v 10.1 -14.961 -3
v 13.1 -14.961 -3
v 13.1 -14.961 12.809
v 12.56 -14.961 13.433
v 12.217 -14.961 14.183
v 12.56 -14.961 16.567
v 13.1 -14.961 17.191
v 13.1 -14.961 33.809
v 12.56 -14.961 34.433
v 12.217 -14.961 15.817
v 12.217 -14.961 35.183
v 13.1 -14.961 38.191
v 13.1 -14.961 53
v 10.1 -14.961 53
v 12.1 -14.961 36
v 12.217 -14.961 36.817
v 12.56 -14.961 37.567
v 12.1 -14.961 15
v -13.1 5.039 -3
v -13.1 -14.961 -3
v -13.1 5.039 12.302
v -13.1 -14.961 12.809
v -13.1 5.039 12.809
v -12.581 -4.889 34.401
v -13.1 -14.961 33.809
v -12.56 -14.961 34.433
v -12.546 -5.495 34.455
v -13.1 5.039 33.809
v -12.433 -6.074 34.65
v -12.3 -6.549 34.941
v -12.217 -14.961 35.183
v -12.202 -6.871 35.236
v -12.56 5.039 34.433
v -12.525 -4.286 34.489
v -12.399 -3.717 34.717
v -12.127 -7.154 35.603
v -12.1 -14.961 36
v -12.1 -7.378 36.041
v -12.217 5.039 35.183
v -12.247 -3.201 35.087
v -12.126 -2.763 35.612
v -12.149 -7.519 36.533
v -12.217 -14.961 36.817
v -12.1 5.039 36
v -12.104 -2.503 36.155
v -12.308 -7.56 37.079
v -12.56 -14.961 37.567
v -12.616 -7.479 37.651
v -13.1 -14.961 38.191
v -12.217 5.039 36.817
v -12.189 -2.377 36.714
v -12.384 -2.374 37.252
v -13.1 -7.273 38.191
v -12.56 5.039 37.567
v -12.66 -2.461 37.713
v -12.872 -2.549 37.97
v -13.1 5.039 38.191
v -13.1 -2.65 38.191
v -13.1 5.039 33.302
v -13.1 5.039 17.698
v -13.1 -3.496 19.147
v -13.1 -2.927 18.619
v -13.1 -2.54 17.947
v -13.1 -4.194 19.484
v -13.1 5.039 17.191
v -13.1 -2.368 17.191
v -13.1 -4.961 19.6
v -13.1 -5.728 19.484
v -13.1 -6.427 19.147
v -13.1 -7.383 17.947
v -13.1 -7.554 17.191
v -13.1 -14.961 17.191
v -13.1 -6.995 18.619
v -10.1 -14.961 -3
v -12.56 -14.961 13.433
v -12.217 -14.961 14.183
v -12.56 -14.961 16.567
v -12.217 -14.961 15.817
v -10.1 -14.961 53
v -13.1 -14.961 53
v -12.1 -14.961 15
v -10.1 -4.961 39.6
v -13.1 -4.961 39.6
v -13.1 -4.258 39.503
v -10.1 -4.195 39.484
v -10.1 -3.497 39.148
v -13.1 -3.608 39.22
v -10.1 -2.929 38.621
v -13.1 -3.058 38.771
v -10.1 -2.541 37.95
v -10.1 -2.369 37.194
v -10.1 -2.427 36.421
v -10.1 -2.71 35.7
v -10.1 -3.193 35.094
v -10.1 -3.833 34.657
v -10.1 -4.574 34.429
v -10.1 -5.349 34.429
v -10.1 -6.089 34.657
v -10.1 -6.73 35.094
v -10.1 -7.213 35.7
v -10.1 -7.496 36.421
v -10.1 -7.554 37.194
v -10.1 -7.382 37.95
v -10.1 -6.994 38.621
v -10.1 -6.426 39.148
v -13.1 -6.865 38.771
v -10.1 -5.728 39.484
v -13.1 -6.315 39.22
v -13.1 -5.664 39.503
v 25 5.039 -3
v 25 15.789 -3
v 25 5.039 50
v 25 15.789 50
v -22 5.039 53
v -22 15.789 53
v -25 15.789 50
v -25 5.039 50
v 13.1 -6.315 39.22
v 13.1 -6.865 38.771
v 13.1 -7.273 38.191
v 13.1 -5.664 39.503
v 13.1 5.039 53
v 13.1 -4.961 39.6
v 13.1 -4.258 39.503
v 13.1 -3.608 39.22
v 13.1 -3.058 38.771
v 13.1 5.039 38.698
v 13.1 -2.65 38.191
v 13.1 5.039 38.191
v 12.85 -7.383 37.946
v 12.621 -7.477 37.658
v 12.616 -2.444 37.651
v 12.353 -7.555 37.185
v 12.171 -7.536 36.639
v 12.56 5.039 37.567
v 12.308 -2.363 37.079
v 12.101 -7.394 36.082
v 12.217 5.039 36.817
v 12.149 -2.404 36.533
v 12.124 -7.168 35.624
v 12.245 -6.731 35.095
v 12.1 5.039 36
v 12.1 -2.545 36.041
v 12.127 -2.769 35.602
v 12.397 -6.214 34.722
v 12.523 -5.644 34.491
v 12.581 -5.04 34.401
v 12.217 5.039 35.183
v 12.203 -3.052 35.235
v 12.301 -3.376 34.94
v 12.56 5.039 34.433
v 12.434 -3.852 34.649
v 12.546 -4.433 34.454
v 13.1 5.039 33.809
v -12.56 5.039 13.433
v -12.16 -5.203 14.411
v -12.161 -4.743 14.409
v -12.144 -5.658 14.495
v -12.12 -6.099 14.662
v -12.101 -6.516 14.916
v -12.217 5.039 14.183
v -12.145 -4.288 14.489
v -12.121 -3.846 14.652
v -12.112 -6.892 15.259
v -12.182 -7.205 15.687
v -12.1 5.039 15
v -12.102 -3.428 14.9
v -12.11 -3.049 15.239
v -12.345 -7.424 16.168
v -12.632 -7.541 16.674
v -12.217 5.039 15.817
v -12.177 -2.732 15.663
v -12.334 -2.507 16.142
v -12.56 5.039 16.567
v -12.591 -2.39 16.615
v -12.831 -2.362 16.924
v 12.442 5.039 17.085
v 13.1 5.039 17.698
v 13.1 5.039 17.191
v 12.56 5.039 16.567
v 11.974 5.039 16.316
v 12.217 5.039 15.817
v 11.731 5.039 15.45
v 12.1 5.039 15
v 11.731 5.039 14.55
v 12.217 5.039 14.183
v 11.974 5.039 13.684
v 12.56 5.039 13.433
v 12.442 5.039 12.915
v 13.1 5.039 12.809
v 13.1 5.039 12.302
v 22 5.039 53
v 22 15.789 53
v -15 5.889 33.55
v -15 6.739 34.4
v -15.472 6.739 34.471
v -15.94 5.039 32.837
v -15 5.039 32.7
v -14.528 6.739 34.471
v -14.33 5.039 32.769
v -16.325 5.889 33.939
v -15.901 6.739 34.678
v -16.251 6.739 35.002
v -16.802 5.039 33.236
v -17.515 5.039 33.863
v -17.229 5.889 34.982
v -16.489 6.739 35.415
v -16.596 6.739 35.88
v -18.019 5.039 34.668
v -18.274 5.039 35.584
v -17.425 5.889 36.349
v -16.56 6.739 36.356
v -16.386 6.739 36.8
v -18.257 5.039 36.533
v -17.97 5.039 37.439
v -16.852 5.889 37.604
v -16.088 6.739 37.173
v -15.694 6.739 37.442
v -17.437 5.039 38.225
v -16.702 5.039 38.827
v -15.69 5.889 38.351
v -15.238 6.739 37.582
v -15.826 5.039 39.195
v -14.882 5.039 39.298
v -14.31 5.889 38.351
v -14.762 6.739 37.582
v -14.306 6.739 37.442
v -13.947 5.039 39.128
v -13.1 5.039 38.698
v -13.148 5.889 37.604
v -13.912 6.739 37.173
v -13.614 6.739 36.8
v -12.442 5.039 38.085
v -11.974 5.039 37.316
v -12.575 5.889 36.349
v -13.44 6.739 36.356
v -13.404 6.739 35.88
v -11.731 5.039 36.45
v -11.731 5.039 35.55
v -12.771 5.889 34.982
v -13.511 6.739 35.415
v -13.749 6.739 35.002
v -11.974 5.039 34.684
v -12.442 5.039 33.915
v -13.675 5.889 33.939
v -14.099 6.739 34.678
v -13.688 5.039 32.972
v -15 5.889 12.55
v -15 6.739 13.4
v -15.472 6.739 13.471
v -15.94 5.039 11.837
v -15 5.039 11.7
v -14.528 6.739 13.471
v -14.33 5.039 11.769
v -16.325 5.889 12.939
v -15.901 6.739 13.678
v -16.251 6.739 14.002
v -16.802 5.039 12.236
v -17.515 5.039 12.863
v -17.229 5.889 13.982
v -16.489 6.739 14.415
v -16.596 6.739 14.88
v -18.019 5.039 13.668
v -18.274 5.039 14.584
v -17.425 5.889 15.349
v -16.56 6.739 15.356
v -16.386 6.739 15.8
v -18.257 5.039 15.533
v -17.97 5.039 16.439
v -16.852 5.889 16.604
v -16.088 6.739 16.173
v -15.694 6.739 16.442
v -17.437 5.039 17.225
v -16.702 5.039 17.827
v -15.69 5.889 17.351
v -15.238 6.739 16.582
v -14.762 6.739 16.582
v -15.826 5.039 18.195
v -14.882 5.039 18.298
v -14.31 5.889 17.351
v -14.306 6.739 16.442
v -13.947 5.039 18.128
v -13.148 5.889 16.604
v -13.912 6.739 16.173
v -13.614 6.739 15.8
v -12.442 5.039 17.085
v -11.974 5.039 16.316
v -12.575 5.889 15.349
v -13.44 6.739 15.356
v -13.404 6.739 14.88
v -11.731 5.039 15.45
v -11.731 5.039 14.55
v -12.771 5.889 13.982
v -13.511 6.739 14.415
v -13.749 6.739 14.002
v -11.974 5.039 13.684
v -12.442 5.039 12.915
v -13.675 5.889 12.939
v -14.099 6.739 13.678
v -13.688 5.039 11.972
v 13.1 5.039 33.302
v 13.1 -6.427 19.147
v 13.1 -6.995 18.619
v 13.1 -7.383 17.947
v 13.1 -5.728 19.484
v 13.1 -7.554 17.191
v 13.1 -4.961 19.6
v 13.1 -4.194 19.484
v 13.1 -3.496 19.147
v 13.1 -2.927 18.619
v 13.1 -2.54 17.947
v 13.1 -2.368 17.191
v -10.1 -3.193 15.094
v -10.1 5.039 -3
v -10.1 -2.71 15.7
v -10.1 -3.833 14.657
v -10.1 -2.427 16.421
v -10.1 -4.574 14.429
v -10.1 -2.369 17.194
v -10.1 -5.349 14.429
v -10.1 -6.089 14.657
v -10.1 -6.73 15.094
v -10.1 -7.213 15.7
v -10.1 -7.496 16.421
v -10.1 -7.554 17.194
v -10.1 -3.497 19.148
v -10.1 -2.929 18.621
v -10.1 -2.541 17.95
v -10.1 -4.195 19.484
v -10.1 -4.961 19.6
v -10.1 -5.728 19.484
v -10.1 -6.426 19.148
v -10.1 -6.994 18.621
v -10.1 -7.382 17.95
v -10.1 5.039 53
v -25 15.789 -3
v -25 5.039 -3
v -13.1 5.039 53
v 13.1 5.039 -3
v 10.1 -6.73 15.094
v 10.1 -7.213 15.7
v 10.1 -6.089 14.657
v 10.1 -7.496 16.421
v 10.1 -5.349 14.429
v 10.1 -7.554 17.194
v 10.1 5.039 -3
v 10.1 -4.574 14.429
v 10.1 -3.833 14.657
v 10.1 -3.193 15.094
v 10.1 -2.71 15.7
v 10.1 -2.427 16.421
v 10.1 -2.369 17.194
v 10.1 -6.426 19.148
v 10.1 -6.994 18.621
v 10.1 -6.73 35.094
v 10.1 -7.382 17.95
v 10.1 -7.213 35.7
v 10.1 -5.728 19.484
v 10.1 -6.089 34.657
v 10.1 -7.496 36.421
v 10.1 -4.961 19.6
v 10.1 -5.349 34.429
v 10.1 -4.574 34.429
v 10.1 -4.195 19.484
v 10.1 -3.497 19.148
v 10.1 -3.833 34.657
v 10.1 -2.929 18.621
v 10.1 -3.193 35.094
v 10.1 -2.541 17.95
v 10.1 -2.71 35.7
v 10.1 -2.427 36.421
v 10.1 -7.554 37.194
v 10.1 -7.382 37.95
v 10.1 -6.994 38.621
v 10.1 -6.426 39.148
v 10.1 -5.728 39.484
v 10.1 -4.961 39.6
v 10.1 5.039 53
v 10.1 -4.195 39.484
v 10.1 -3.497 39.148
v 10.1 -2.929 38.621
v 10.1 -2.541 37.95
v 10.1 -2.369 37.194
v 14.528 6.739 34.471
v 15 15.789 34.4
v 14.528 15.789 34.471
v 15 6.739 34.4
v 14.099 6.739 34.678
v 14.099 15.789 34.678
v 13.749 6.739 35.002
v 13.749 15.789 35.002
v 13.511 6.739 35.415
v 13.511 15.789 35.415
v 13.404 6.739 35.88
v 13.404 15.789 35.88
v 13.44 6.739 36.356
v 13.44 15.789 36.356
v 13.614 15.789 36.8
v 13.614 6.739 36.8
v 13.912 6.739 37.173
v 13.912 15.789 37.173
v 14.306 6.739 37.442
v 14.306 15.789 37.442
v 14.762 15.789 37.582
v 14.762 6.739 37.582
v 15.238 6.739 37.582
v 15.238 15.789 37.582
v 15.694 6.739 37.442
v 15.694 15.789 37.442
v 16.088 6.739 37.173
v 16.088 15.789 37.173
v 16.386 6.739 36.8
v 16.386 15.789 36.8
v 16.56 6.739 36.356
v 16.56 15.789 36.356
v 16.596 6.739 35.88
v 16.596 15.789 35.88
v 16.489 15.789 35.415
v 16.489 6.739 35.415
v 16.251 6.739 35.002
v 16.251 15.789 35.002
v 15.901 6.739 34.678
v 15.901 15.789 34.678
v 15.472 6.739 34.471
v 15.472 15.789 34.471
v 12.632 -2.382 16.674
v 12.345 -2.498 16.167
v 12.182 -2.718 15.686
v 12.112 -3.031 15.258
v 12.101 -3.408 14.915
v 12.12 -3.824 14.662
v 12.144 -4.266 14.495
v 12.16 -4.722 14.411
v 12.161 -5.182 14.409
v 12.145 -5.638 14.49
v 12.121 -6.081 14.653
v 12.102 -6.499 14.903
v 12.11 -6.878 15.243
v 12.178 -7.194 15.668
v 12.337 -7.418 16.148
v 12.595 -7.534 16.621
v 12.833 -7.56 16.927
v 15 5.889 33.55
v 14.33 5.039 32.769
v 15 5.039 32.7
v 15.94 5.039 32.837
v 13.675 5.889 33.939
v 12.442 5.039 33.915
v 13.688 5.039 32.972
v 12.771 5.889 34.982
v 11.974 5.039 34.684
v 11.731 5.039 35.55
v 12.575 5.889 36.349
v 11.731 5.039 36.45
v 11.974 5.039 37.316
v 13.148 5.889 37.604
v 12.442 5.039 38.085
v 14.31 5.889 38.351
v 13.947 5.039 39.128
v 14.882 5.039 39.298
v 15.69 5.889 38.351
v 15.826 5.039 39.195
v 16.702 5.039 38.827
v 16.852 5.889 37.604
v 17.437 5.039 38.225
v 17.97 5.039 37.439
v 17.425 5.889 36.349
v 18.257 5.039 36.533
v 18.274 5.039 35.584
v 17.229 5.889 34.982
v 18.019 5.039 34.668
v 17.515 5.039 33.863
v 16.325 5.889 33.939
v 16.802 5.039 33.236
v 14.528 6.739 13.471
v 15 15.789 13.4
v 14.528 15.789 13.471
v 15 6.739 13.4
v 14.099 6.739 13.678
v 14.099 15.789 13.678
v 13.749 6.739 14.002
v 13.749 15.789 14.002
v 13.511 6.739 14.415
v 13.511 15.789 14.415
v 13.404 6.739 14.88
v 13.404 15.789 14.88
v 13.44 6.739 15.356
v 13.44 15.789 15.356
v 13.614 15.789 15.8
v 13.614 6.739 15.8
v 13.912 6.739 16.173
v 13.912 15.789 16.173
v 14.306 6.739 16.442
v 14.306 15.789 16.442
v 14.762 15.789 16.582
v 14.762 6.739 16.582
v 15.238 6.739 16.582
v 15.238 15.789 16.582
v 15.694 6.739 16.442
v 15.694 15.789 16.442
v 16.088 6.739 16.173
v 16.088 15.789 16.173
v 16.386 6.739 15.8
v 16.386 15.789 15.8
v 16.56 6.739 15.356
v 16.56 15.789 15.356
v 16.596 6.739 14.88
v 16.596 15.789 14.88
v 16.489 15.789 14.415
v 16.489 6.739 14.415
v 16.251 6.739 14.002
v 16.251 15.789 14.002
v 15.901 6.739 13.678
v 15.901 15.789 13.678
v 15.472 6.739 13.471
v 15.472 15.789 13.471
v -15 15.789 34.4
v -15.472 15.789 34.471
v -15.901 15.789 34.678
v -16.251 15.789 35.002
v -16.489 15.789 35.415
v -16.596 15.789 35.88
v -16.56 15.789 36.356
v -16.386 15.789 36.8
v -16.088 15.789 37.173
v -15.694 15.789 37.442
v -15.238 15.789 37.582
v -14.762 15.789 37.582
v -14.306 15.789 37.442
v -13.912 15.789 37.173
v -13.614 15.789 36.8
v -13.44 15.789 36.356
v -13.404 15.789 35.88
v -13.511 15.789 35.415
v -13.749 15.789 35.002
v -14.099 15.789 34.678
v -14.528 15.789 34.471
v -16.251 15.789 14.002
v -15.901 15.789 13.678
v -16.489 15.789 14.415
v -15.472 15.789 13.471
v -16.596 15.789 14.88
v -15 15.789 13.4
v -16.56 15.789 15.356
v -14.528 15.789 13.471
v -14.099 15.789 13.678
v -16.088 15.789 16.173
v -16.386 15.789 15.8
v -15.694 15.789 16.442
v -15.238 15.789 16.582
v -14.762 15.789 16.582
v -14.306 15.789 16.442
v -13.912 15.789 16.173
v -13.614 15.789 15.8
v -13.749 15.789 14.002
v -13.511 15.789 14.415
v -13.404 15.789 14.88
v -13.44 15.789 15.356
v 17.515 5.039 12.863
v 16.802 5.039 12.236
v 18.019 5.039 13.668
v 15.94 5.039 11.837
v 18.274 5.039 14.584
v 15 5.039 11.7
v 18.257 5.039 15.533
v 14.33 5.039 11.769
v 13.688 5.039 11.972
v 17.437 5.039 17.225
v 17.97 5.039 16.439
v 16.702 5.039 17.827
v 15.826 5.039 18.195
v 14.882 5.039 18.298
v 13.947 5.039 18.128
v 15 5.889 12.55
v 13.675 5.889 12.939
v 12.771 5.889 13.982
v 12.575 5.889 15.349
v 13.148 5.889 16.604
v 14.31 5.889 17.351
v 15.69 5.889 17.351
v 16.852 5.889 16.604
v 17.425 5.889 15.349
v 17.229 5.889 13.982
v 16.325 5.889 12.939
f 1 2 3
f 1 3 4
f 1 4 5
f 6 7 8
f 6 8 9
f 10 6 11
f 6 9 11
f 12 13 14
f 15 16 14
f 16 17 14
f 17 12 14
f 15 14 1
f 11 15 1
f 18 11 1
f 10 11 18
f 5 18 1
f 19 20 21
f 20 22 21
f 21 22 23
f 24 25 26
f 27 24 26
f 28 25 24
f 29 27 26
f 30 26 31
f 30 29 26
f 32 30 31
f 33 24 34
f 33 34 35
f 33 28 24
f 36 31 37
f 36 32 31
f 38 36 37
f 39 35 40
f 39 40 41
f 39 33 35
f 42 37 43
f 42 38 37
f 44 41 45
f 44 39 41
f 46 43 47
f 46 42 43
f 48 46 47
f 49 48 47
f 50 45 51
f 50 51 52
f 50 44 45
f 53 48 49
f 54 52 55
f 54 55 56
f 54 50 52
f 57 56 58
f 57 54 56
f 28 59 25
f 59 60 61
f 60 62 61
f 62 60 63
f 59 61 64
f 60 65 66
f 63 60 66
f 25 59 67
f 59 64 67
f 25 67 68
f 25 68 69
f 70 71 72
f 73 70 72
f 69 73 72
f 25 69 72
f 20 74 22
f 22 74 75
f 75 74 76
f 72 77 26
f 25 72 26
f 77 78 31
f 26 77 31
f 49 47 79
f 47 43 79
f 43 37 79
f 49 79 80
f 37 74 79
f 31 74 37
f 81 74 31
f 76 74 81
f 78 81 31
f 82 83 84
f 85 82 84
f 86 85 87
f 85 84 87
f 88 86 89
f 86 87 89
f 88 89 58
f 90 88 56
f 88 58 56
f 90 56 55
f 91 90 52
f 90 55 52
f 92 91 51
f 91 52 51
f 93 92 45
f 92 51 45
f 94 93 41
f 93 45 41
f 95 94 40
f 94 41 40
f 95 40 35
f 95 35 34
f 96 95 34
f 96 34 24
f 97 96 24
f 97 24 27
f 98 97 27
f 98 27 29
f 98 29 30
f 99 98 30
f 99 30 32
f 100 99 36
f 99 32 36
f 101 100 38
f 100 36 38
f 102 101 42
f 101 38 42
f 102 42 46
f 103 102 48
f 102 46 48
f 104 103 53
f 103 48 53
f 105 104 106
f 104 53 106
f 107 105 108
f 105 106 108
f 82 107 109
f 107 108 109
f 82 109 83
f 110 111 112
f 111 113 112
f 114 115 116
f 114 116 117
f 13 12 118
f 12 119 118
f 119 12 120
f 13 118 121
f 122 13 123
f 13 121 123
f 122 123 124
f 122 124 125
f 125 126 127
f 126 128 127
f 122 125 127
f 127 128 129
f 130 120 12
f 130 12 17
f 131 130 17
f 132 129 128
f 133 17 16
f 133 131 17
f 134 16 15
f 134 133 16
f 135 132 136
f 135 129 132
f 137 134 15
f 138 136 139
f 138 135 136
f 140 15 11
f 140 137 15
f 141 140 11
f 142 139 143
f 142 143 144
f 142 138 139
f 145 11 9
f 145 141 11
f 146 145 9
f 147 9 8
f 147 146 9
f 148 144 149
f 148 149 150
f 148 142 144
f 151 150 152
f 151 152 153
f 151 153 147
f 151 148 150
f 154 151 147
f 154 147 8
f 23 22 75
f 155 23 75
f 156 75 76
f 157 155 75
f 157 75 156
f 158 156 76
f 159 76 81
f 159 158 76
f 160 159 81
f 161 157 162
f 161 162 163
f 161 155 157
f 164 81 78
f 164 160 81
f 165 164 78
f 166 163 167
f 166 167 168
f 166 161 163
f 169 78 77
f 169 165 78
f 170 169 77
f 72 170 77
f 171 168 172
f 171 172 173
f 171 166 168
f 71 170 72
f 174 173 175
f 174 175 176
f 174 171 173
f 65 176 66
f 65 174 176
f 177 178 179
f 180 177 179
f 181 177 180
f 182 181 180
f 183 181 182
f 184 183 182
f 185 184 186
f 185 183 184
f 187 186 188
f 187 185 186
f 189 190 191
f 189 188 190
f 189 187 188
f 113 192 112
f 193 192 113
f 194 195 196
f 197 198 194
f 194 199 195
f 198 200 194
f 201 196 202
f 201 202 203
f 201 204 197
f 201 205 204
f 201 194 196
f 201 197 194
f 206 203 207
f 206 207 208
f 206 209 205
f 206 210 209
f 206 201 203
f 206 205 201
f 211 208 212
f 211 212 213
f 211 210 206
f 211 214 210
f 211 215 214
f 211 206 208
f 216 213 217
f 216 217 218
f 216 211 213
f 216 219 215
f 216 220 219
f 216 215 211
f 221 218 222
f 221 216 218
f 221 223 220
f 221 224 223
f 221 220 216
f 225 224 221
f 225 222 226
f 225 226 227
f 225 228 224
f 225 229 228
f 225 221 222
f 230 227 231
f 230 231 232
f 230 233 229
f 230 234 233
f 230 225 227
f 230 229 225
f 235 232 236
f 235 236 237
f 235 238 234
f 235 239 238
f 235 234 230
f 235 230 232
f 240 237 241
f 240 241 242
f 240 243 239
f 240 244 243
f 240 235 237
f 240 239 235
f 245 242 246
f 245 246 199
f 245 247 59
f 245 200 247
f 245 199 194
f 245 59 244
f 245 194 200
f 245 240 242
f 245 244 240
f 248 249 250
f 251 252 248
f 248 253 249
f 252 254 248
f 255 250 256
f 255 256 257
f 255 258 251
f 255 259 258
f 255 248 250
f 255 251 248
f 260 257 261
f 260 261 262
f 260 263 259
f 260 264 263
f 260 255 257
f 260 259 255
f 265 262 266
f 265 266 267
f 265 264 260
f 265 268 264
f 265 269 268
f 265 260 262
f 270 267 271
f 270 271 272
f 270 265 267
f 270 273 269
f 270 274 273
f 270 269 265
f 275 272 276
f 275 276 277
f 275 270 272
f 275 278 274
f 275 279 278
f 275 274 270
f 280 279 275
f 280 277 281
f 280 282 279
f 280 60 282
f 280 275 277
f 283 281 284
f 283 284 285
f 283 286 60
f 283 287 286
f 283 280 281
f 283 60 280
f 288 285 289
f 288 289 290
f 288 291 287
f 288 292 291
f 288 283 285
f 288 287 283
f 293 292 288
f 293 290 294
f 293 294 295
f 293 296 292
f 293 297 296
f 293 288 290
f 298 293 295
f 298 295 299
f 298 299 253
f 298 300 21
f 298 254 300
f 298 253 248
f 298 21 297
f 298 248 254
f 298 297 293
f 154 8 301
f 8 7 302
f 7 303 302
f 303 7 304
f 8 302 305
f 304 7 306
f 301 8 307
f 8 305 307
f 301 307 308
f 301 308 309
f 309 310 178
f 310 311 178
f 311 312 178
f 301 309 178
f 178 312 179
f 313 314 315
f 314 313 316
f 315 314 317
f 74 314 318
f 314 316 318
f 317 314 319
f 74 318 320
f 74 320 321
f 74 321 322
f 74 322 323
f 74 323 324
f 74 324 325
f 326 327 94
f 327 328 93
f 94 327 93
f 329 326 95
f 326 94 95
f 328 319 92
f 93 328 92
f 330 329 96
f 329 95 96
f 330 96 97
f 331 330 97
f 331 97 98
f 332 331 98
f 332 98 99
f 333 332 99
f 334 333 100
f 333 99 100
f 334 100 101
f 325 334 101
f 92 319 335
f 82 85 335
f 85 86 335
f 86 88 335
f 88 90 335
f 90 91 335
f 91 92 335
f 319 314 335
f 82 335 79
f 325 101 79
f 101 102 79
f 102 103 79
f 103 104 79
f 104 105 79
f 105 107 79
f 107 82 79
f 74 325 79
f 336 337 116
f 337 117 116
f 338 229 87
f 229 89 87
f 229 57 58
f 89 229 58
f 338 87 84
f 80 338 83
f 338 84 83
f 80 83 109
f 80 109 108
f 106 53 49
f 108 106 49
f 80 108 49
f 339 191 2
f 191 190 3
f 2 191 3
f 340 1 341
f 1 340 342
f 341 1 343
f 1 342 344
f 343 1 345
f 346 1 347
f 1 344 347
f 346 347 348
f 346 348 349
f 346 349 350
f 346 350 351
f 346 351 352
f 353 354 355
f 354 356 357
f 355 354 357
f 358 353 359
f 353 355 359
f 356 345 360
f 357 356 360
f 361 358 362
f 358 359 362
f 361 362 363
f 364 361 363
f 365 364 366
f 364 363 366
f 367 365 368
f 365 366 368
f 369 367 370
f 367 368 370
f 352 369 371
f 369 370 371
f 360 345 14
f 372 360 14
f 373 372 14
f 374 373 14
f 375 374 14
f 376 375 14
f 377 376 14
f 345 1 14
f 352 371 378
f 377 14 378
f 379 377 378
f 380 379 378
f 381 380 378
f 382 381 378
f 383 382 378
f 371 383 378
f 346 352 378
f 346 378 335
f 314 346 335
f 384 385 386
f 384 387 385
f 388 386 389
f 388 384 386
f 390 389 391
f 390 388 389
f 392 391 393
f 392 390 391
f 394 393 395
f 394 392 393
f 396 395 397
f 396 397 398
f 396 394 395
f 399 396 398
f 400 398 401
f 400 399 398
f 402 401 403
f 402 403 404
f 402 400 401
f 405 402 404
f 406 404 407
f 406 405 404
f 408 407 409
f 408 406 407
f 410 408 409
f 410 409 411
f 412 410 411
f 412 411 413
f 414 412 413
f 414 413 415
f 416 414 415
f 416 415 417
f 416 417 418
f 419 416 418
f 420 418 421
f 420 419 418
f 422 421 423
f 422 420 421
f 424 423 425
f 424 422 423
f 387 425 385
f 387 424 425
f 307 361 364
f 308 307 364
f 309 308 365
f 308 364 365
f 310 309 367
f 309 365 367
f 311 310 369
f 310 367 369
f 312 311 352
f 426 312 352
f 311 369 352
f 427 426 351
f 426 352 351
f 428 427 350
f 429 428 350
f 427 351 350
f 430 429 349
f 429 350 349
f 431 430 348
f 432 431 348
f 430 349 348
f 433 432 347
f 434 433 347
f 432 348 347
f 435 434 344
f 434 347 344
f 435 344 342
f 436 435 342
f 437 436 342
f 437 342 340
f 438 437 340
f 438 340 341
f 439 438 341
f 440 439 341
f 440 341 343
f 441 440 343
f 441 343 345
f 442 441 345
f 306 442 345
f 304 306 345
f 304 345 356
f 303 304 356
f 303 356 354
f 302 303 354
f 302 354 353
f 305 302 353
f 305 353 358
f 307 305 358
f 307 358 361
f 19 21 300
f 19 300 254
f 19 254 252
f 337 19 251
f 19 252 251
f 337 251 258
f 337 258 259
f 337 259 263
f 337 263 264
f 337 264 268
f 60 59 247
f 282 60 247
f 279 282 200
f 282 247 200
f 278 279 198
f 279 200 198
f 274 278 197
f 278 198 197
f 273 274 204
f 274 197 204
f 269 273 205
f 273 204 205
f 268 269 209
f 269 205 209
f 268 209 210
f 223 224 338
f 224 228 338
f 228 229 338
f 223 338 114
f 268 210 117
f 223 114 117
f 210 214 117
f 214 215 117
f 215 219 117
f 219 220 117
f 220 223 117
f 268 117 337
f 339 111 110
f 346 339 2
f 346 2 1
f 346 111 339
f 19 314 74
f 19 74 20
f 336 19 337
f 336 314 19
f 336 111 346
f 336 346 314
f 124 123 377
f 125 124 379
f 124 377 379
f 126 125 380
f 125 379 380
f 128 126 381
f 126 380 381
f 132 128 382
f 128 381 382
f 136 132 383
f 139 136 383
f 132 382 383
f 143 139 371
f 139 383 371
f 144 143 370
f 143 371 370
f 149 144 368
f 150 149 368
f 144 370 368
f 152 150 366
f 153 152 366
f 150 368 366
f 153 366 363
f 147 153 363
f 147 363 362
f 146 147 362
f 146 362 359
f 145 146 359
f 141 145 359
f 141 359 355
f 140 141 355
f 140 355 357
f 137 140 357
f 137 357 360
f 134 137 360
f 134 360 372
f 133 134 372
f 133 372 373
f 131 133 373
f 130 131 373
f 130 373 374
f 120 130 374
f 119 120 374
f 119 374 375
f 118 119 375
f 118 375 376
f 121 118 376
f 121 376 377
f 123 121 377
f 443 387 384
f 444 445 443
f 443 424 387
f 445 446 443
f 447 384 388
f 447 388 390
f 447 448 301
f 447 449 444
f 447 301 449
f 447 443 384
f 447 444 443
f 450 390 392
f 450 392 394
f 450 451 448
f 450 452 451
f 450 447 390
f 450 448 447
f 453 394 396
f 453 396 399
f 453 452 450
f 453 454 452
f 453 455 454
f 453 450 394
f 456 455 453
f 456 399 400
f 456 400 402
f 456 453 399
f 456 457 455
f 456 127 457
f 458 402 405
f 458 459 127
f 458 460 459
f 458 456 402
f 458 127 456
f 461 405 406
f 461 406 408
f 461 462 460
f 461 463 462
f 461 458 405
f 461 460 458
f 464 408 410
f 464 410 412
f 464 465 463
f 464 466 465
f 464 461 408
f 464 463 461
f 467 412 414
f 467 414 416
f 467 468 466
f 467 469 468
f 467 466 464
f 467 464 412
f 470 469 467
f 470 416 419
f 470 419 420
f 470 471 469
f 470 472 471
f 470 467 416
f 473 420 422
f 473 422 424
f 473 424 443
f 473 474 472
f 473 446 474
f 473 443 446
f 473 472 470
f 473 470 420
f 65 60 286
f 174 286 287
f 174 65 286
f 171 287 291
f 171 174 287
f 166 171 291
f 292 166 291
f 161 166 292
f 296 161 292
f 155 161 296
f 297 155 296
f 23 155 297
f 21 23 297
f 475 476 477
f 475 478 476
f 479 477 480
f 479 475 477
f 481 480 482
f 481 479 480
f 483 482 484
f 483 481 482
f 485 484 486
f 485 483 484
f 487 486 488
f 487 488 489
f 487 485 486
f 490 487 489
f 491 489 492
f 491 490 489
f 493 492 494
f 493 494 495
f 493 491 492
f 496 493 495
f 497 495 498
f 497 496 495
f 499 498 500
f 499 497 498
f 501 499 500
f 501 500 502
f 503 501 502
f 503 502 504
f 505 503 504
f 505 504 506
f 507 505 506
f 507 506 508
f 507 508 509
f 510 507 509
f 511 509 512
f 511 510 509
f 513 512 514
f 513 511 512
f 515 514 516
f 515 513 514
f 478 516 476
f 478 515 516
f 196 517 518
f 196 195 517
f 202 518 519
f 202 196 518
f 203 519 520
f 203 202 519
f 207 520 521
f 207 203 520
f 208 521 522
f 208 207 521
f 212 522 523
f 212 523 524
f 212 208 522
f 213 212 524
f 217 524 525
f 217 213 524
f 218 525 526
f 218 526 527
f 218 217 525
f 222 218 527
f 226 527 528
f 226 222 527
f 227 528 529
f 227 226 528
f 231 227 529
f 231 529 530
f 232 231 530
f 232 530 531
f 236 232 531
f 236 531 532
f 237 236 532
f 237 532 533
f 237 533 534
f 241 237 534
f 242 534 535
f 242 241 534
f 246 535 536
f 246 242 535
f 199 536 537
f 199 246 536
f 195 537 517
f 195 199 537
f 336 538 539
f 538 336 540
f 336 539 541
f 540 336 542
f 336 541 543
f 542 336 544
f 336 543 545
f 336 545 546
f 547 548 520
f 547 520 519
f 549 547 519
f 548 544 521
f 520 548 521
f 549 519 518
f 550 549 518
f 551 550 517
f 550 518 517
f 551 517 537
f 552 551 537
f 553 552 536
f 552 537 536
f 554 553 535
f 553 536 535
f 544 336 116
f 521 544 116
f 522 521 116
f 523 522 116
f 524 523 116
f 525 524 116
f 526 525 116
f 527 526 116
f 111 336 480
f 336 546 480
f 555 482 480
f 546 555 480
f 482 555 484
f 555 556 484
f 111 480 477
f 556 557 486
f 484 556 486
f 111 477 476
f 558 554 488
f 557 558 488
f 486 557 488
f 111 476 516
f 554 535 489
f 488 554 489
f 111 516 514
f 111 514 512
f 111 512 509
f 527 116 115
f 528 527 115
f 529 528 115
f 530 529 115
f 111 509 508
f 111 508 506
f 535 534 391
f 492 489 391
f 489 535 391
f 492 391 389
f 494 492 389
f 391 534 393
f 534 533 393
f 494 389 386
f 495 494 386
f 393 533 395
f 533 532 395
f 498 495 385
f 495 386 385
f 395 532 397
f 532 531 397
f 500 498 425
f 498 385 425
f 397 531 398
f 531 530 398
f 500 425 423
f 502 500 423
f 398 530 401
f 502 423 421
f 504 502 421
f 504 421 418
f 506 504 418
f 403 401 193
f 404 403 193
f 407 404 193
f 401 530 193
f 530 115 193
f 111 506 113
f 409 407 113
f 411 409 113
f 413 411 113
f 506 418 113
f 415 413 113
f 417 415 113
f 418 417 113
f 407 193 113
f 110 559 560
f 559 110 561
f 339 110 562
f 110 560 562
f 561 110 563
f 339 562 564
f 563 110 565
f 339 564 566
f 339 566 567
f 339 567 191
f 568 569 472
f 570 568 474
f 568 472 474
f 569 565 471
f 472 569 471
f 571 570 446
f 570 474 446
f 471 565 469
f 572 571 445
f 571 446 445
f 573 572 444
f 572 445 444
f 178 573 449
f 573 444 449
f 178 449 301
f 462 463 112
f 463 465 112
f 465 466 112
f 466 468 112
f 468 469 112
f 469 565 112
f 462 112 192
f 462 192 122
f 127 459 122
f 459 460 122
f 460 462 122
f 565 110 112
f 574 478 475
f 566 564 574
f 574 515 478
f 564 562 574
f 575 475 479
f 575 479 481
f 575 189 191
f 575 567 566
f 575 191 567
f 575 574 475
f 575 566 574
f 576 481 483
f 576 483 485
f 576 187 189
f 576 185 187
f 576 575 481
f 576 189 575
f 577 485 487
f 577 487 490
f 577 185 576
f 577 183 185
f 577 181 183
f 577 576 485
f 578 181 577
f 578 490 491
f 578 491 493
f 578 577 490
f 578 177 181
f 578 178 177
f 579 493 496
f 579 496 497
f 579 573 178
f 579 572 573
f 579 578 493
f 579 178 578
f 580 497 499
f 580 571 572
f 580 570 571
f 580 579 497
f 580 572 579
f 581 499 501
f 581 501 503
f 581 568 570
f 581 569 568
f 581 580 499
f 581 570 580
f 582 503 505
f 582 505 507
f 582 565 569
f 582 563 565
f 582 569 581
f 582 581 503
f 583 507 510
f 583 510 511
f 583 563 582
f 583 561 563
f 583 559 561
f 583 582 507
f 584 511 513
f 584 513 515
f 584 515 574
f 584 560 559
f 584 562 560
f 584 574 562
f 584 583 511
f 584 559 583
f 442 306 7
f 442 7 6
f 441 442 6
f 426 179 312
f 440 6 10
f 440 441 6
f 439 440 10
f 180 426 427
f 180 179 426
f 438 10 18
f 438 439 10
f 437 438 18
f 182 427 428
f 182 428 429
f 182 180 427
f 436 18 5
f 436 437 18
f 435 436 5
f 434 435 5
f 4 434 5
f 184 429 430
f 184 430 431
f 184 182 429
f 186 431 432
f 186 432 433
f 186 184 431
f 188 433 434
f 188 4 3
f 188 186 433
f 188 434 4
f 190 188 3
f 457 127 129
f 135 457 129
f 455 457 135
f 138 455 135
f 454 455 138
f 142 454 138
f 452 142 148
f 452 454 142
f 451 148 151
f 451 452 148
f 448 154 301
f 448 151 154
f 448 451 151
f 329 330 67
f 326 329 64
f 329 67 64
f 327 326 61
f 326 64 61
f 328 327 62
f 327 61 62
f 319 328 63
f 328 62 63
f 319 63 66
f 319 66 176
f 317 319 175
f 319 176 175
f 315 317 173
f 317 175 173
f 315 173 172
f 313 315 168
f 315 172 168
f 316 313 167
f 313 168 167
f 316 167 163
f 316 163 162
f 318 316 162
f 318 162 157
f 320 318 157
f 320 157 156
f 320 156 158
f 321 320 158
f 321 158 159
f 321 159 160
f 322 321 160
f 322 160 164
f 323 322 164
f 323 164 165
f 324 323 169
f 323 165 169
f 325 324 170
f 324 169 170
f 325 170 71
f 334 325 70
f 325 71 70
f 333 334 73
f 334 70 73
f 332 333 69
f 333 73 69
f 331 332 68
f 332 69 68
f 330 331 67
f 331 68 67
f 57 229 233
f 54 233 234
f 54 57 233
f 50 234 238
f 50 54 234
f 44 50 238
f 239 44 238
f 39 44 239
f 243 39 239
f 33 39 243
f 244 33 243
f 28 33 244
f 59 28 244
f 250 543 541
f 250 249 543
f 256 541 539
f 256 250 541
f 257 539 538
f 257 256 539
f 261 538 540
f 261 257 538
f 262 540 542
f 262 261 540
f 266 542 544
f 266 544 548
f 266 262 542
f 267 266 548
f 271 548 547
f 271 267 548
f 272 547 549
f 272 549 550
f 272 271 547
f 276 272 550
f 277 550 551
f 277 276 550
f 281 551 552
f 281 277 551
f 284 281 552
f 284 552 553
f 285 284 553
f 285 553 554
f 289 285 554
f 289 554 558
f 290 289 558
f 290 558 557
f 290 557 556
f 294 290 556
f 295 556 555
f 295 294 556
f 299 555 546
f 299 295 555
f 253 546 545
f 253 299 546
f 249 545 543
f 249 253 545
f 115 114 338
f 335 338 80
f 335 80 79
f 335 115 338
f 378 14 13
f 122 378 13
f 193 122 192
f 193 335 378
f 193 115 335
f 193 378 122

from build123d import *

# Parameters (mm, degrees)
EXTRUDE_1_DEPTH             = 53
HOLE_WIZARD_1_D             = 3
SKETCH_6_R                  = 2.9
CUT_EXTRUDE_1_DEPTH         = 62.919302322
CHAMFER_1_SIZE              = 3
HOLE_WIZARD_2_D             = 5.2
HOLE_WIZARD_M3_1_AT_2_COUNT = 2
HOLE_WIZARD_M3_1_AT_2_PITCH = 30
HOLE_WIZARD_M3_1_AT_3_COUNT = 2
HOLE_WIZARD_M3_1_AT_3_PITCH = 36.619666847
HOLE_WIZARD_M3_1_AT_4_COUNT = 2
HOLE_WIZARD_M3_1_AT_4_PITCH = 21
EXTRUDE_2_DEPTH             = 3


with BuildPart() as part:
    # 草图1 → 凸台-拉伸1 (new body)
    with BuildSketch(Plane.XY):
        Polygon((-13.1, -14.961364275), (-10.1, -14.961364275), (-10.1, 5.038635725), (10.1, 5.038635725), (10.1, -14.961364275), (13.1, -14.961364275), (13.1, 5.038635725), (25, 5.038635725), (25, 15.788635725), (-25, 15.788635725), (-25, 5.038635725), (-13.1, 5.038635725), align=None)
    extrude(amount=EXTRUDE_1_DEPTH)

    # 孔1 (through all)
    with Locations(Plane(origin=(0, 5.038635725, 0), x_dir=(-1, 0, 0), z_dir=(0, -1, 0))):
        with Locations((15, -15), (15, -36), (-15, -15), (-15, -36)):
            Hole(HOLE_WIZARD_1_D / 2)

    # 草图6 → 切除-拉伸1 (cut, through all)
    with BuildSketch(Plane.XZ.offset(-5.038635725)):
        with Locations((15, 36)):
            Circle(SKETCH_6_R)
        with Locations((15, 15)):
            Circle(SKETCH_6_R)
        with Locations((-15, 15)):
            Circle(SKETCH_6_R)
        with Locations((-15, 36)):
            Circle(SKETCH_6_R)
    extrude(amount=CUT_EXTRUDE_1_DEPTH, mode=Mode.SUBTRACT)

    # 倒角1
    chamfer_1_edges = [part.edges().sort_by_distance(p)[0] for p in [
        (-25, 10.413635725, 53),
        (25, 10.413635725, 53),
    ]]
    chamfer(chamfer_1_edges, length=CHAMFER_1_SIZE)

    # 孔2 (through all)
    with Locations(Plane(origin=(13.1, 0, 0), x_dir=(0, 0, -1), z_dir=(1, 0, 0))):
        with Locations((-17, -4.961364275), (-37, -4.961364275)):
            Hole(HOLE_WIZARD_2_D / 2)

    # 草图10 → M3 十字槽沉头木螺钉的锥形沉头孔1 (revolve, cut)
    with BuildSketch(Plane(origin=(15, 5.038635725, 15), x_dir=(0, 0, -1), z_dir=(1, 0, 0))):
        Polygon((0, 0), (0, 10.75), (1.6, 10.75), (1.6, 1.7), (3.3, 0), align=None)
    hole_wizard_m3_1 = revolve(axis=Axis((15, -1.311364275, 15), (0, 1, 0)), mode=Mode.SUBTRACT)

    # M3 十字槽沉头木螺钉的锥形沉头孔1 at 2: M3 十字槽沉头木螺钉的锥形沉头孔1 ×2
    with Locations(*[(-i * HOLE_WIZARD_M3_1_AT_2_PITCH, 0, 0) for i in range(1, HOLE_WIZARD_M3_1_AT_2_COUNT)]):
        add(hole_wizard_m3_1, mode=Mode.SUBTRACT)

    # M3 十字槽沉头木螺钉的锥形沉头孔1 at 3: M3 十字槽沉头木螺钉的锥形沉头孔1 ×2
    with Locations(*[Vector(-0.8192319205190406, 0, 0.5734623443633283) * (i * HOLE_WIZARD_M3_1_AT_3_PITCH) for i in range(1, HOLE_WIZARD_M3_1_AT_3_COUNT)]):
        add(hole_wizard_m3_1, mode=Mode.SUBTRACT)

    # M3 十字槽沉头木螺钉的锥形沉头孔1 at 4: M3 十字槽沉头木螺钉的锥形沉头孔1 ×2
    with Locations(*[(0, 0, i * HOLE_WIZARD_M3_1_AT_4_PITCH) for i in range(1, HOLE_WIZARD_M3_1_AT_4_COUNT)]):
        add(hole_wizard_m3_1, mode=Mode.SUBTRACT)

    # 草图12 → 凸台-拉伸2 (add)
    with BuildSketch(Plane(origin=(0, 0, 0), x_dir=(-1, 0, 0), z_dir=(0, 0, -1))):
        Polygon((-10.1, 5.038635725), (10.1, 5.038635725), (10.1, -14.961364275), (13.1, -14.961364275), (13.1, 5.038635725), (25, 5.038635725), (25, 15.788635725), (-25, 15.788635725), (-25, 5.038635725), (-13.1, 5.038635725), (-13.1, -14.961364275), (-10.1, -14.961364275), align=None)
    extrude(amount=EXTRUDE_2_DEPTH)


solid = part.part
